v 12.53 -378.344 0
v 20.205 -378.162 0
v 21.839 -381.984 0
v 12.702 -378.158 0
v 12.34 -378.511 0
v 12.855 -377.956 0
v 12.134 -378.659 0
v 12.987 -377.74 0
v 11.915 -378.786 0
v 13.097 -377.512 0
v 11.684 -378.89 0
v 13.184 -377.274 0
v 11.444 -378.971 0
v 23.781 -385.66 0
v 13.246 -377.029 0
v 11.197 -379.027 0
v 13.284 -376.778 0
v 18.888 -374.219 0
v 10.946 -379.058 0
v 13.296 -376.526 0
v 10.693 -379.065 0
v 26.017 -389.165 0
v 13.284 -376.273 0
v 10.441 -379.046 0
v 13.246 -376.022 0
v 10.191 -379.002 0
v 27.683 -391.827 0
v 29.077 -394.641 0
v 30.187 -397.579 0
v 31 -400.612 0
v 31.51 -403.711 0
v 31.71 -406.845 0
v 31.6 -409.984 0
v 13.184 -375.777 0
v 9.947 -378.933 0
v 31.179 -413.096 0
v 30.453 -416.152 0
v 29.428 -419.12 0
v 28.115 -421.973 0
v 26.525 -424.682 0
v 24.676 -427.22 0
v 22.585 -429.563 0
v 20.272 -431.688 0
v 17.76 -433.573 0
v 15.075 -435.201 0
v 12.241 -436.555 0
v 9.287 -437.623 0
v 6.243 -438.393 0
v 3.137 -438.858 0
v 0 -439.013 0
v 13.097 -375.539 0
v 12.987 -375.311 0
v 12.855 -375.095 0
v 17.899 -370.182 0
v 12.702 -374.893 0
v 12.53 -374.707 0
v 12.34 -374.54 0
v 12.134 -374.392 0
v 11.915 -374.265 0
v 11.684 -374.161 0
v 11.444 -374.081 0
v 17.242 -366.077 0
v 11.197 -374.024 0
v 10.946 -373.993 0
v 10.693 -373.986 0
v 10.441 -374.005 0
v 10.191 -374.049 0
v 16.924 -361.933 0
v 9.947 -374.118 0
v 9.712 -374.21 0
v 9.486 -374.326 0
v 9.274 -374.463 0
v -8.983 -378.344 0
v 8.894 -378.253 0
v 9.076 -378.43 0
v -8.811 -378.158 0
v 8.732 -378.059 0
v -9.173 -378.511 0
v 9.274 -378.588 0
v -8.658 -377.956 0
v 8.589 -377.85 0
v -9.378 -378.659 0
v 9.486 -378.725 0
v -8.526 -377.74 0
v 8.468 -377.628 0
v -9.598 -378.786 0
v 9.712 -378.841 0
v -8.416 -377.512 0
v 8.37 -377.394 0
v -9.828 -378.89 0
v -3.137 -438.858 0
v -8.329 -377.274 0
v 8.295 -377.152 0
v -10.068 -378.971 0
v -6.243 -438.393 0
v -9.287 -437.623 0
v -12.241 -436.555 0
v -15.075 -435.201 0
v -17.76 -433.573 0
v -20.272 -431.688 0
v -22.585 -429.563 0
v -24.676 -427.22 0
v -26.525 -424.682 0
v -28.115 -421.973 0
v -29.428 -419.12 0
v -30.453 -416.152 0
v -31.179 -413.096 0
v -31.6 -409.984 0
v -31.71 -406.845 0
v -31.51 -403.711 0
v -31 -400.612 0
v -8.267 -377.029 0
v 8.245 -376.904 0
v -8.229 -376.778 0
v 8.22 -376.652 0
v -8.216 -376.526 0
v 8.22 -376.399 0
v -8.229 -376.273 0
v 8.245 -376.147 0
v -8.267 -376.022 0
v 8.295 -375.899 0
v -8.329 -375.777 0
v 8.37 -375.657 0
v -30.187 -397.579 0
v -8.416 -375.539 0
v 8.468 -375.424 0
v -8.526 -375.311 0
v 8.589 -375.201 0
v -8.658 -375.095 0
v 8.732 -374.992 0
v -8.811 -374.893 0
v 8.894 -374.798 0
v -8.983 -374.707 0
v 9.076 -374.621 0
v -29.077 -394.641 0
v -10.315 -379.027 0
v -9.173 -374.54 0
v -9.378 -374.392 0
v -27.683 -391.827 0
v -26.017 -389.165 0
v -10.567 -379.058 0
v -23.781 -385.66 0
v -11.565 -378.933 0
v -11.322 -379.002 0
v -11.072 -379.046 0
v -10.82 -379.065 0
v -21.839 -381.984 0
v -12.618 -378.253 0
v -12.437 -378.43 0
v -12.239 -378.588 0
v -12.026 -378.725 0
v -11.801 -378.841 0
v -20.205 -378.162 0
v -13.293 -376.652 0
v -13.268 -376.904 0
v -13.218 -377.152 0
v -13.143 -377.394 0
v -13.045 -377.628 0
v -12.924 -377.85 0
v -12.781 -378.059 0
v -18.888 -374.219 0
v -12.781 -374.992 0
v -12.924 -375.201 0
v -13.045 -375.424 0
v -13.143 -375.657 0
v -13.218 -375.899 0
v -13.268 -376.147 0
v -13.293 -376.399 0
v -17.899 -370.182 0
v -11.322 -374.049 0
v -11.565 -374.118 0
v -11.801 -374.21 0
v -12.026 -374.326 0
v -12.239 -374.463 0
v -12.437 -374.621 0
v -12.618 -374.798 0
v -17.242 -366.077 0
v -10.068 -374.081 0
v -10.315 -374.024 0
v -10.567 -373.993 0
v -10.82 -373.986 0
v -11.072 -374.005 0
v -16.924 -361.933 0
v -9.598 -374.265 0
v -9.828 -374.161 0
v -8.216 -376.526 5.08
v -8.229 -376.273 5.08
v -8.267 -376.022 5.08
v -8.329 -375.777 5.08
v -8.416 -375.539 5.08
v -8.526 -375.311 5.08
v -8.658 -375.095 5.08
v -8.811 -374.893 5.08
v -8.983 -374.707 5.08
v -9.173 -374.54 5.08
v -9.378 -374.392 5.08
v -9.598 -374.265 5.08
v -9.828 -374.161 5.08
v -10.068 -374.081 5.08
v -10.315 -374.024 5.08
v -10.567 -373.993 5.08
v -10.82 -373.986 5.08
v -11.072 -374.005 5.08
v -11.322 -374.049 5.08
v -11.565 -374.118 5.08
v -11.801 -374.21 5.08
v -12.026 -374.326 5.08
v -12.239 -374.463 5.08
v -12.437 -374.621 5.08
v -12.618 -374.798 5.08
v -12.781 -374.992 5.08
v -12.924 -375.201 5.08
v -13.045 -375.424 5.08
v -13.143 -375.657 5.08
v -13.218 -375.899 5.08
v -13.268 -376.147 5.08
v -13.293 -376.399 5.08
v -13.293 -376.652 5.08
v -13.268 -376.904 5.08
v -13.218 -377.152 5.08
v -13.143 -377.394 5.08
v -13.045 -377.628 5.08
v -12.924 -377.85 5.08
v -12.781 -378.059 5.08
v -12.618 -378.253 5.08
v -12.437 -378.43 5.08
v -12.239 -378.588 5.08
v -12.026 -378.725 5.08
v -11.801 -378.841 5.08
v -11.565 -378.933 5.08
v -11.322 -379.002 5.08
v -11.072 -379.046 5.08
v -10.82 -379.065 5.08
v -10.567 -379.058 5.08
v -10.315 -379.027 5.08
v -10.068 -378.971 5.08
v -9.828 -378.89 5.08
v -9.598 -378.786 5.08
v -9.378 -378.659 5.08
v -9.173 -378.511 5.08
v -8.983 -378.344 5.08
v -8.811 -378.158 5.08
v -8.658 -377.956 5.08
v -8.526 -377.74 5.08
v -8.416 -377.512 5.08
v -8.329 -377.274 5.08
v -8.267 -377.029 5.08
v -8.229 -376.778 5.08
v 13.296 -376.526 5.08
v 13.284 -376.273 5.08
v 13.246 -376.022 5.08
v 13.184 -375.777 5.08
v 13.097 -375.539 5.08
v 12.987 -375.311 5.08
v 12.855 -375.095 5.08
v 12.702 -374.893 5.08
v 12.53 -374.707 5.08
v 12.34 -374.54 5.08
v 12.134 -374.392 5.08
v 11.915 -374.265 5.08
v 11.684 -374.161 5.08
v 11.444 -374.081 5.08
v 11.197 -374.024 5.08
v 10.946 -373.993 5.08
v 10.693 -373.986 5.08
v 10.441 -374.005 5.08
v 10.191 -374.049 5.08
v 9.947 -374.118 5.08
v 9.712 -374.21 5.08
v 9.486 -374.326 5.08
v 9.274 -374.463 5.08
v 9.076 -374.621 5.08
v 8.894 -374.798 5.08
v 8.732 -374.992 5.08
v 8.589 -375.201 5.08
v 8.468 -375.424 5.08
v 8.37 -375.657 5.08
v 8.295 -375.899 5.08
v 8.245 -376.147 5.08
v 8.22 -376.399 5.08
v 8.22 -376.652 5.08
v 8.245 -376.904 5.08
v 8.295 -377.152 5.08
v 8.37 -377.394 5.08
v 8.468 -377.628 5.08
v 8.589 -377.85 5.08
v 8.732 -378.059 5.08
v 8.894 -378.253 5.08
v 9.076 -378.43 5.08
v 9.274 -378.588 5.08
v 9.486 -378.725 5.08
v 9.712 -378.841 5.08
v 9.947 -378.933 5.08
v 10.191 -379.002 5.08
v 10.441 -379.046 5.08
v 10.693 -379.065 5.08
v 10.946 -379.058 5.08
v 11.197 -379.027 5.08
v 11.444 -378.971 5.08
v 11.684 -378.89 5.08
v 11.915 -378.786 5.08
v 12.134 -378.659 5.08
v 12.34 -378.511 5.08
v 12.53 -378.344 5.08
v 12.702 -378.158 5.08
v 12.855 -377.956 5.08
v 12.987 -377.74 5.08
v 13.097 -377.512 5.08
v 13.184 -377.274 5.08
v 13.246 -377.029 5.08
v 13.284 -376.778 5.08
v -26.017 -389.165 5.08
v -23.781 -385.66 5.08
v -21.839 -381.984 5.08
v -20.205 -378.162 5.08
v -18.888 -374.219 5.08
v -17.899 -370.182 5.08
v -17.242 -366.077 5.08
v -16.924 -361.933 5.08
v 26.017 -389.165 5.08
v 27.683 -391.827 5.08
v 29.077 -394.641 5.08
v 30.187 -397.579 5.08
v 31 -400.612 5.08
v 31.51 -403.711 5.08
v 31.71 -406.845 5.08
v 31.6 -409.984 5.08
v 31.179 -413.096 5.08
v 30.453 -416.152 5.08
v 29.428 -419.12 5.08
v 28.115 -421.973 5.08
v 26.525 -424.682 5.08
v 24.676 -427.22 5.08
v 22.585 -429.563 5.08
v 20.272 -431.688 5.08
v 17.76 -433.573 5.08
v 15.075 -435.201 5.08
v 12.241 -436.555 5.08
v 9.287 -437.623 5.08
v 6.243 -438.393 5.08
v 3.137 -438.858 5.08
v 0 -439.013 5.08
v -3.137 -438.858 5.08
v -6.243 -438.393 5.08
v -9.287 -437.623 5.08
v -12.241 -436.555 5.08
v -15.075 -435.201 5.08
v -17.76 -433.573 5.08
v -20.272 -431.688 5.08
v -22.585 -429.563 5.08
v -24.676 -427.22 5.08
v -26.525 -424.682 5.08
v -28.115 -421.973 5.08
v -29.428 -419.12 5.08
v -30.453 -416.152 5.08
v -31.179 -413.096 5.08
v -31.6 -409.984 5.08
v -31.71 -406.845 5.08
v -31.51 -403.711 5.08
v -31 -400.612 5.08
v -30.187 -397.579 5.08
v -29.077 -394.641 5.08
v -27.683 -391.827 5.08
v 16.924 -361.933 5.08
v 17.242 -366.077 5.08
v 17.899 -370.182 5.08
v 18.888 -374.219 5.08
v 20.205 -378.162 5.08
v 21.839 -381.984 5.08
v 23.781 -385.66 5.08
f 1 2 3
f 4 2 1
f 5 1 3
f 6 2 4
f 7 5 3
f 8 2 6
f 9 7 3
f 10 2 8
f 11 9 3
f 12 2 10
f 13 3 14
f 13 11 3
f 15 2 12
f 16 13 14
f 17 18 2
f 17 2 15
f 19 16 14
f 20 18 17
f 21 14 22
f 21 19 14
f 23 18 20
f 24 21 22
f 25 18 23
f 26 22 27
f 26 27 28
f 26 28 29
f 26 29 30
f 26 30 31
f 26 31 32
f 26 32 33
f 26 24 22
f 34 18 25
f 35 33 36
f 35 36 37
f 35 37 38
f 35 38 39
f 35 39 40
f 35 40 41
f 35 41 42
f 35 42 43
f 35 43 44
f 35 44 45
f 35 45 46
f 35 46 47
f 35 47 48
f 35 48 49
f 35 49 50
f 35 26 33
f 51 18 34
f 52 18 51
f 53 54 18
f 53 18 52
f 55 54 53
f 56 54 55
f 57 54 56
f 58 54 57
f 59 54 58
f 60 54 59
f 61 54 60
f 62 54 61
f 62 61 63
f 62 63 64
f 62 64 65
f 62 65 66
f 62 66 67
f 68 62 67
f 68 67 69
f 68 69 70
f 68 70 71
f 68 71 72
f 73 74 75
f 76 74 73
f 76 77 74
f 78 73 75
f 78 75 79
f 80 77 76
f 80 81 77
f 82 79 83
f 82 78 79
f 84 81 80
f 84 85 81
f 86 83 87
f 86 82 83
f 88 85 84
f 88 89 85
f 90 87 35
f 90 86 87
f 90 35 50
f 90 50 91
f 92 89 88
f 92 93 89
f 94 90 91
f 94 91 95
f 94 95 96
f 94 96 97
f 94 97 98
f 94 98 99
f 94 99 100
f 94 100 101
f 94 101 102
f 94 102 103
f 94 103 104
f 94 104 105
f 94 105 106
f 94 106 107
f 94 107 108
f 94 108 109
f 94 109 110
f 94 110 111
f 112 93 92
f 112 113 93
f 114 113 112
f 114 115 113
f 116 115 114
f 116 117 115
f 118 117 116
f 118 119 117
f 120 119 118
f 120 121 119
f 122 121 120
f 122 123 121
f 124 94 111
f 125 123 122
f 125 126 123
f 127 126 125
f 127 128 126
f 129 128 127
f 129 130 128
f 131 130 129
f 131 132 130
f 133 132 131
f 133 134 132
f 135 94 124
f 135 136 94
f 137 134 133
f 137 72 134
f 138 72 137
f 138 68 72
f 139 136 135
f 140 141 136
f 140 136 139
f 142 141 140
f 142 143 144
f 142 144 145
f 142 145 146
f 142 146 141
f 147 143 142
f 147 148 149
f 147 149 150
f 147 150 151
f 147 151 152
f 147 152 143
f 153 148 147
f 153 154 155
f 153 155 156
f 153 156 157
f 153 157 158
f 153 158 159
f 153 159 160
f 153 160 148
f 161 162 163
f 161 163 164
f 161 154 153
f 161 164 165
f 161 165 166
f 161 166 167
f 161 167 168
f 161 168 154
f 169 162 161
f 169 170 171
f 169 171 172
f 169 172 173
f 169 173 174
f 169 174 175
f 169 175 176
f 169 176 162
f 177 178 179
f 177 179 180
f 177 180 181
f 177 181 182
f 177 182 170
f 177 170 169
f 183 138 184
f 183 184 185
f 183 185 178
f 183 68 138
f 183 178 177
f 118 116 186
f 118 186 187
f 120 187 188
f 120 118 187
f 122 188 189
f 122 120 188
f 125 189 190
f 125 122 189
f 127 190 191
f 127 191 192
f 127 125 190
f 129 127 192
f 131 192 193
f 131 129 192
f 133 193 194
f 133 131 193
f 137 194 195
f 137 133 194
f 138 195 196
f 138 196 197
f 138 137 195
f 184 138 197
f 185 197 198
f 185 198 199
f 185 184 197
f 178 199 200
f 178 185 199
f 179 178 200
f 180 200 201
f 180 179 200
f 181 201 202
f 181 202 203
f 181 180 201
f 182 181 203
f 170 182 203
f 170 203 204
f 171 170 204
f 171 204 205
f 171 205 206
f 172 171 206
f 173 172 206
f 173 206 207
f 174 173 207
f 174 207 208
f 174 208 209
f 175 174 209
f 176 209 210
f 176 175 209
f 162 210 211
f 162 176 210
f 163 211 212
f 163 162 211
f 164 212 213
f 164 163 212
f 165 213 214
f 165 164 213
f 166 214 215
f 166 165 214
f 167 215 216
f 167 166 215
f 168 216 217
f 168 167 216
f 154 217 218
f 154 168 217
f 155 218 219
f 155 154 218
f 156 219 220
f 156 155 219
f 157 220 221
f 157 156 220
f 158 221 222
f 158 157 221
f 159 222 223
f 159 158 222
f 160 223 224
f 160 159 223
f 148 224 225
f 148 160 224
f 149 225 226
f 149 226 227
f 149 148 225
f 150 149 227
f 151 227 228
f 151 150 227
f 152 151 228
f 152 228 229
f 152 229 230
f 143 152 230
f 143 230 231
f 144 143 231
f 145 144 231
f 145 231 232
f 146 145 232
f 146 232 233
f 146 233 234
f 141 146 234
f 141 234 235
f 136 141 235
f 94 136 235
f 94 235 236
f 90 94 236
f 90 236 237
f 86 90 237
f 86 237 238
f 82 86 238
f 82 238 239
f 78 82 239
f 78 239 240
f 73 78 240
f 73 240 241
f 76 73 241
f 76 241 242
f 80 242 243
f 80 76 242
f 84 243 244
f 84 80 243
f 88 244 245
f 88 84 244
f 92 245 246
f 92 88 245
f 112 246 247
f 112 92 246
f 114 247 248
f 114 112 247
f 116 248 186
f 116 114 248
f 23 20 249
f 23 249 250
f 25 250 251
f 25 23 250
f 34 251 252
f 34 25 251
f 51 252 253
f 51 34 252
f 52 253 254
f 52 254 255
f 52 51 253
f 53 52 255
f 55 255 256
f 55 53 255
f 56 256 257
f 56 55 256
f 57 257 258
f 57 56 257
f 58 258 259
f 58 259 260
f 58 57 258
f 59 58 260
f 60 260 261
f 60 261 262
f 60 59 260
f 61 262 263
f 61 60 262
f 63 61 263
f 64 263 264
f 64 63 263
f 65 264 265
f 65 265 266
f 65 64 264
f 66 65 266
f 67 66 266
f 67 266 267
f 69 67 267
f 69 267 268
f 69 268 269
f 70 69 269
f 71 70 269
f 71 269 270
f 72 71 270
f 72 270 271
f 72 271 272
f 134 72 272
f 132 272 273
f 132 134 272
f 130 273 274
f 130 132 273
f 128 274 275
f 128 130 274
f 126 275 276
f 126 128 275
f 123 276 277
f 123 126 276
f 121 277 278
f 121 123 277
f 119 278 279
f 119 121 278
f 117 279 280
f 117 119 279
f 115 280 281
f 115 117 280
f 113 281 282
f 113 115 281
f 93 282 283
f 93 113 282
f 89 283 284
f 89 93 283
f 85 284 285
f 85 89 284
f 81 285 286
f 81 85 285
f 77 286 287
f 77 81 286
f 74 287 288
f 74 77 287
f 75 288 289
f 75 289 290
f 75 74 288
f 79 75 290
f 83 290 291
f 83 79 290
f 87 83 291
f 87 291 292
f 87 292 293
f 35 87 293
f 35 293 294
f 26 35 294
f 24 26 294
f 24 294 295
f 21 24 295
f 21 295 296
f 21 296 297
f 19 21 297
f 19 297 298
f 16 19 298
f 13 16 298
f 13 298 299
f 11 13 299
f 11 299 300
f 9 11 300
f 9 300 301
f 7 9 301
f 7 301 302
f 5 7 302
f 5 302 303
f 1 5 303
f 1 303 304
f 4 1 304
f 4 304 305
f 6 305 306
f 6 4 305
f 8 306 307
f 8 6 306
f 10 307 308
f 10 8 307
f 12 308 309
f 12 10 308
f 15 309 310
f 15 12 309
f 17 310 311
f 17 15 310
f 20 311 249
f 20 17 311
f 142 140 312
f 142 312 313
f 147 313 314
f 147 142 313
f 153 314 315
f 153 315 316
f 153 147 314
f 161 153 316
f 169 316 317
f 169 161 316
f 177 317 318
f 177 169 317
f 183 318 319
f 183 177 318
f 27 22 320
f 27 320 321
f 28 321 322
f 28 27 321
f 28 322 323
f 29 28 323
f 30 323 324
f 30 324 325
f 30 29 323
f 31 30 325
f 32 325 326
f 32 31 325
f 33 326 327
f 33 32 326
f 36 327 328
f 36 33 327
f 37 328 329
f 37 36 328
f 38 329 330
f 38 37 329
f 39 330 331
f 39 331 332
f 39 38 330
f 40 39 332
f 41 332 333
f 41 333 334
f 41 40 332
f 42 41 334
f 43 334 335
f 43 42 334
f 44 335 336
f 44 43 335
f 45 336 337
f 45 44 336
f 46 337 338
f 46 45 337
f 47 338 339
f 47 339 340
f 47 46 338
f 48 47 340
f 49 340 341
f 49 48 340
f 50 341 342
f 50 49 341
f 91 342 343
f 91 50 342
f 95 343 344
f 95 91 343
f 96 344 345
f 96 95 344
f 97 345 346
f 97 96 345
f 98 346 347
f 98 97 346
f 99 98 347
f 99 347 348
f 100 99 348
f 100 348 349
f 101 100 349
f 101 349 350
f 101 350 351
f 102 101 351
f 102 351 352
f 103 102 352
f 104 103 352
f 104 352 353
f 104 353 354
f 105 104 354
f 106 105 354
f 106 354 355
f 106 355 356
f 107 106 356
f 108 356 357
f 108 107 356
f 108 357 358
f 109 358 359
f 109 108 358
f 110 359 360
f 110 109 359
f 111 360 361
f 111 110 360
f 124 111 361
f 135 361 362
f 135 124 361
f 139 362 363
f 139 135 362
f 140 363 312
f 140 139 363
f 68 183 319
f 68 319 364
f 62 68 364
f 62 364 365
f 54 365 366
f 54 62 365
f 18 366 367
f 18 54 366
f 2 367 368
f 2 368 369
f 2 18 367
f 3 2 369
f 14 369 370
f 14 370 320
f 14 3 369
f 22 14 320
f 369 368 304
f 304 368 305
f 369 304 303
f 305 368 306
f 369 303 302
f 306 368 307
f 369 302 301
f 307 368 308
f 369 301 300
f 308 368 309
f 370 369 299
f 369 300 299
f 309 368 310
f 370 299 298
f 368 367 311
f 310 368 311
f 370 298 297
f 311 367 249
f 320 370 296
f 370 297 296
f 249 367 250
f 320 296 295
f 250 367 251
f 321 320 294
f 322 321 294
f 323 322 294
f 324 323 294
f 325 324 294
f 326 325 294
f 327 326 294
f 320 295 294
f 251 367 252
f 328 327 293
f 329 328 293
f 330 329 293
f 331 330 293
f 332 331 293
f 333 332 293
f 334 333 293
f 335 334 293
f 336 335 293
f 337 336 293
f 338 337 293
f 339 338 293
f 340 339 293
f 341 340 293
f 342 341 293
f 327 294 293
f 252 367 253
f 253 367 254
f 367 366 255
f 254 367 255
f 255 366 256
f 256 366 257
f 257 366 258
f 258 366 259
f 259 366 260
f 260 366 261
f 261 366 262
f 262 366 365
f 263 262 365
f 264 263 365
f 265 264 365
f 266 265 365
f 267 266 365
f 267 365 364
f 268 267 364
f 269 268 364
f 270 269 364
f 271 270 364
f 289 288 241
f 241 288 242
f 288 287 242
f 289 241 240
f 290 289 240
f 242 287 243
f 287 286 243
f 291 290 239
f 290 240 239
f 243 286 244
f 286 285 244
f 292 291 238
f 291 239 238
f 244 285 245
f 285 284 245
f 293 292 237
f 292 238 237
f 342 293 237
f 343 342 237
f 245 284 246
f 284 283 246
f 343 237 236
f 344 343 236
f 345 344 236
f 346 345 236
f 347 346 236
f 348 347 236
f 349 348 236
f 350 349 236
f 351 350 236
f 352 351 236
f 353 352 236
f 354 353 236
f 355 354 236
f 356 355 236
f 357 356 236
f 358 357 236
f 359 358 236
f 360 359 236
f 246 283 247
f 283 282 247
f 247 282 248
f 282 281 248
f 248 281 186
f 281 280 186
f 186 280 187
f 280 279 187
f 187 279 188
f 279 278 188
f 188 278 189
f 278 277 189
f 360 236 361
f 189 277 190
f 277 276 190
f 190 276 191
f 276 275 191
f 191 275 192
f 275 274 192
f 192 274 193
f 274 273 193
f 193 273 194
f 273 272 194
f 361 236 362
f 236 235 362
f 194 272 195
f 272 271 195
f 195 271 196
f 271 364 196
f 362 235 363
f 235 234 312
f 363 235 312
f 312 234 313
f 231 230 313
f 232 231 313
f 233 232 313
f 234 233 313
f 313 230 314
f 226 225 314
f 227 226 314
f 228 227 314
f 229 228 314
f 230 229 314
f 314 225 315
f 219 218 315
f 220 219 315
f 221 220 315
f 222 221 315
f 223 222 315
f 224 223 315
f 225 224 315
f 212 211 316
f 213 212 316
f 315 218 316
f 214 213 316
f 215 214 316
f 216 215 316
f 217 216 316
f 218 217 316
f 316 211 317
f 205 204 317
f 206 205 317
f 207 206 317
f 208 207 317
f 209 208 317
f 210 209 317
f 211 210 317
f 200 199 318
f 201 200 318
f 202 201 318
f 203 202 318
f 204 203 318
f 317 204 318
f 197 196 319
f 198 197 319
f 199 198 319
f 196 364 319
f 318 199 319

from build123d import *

# Parameters (mm, degrees)
SKETCH1_R           = 2.54
BOSS_EXTRUDE1_DEPTH = 5.08


with BuildPart() as part:
    # Sketch1 → Boss-Extrude1 (new body)
    with BuildSketch(Plane.XY):
        with BuildLine():
            Line((-16.923532905, -361.932719801), (16.923532905, -361.932719801))
            ThreePointArc((16.923532905, -361.932719801), (19.506243092, -376.204363349), (26.016534546, -389.164544931))
            ThreePointArc((26.016534546, -389.164544931), (0, -439.01304823), (-26.016534546, -389.164544931))
            ThreePointArc((-26.016534546, -389.164544931), (-19.506243092, -376.204363349), (-16.923532905, -361.932719801))
        make_face()
        with Locations((-10.756405179, -376.525575709)):
            Circle(SKETCH1_R, mode=Mode.SUBTRACT)
        with Locations((10.756405179, -376.525575709)):
            Circle(SKETCH1_R, mode=Mode.SUBTRACT)
    extrude(amount=BOSS_EXTRUDE1_DEPTH)


solid = part.part
